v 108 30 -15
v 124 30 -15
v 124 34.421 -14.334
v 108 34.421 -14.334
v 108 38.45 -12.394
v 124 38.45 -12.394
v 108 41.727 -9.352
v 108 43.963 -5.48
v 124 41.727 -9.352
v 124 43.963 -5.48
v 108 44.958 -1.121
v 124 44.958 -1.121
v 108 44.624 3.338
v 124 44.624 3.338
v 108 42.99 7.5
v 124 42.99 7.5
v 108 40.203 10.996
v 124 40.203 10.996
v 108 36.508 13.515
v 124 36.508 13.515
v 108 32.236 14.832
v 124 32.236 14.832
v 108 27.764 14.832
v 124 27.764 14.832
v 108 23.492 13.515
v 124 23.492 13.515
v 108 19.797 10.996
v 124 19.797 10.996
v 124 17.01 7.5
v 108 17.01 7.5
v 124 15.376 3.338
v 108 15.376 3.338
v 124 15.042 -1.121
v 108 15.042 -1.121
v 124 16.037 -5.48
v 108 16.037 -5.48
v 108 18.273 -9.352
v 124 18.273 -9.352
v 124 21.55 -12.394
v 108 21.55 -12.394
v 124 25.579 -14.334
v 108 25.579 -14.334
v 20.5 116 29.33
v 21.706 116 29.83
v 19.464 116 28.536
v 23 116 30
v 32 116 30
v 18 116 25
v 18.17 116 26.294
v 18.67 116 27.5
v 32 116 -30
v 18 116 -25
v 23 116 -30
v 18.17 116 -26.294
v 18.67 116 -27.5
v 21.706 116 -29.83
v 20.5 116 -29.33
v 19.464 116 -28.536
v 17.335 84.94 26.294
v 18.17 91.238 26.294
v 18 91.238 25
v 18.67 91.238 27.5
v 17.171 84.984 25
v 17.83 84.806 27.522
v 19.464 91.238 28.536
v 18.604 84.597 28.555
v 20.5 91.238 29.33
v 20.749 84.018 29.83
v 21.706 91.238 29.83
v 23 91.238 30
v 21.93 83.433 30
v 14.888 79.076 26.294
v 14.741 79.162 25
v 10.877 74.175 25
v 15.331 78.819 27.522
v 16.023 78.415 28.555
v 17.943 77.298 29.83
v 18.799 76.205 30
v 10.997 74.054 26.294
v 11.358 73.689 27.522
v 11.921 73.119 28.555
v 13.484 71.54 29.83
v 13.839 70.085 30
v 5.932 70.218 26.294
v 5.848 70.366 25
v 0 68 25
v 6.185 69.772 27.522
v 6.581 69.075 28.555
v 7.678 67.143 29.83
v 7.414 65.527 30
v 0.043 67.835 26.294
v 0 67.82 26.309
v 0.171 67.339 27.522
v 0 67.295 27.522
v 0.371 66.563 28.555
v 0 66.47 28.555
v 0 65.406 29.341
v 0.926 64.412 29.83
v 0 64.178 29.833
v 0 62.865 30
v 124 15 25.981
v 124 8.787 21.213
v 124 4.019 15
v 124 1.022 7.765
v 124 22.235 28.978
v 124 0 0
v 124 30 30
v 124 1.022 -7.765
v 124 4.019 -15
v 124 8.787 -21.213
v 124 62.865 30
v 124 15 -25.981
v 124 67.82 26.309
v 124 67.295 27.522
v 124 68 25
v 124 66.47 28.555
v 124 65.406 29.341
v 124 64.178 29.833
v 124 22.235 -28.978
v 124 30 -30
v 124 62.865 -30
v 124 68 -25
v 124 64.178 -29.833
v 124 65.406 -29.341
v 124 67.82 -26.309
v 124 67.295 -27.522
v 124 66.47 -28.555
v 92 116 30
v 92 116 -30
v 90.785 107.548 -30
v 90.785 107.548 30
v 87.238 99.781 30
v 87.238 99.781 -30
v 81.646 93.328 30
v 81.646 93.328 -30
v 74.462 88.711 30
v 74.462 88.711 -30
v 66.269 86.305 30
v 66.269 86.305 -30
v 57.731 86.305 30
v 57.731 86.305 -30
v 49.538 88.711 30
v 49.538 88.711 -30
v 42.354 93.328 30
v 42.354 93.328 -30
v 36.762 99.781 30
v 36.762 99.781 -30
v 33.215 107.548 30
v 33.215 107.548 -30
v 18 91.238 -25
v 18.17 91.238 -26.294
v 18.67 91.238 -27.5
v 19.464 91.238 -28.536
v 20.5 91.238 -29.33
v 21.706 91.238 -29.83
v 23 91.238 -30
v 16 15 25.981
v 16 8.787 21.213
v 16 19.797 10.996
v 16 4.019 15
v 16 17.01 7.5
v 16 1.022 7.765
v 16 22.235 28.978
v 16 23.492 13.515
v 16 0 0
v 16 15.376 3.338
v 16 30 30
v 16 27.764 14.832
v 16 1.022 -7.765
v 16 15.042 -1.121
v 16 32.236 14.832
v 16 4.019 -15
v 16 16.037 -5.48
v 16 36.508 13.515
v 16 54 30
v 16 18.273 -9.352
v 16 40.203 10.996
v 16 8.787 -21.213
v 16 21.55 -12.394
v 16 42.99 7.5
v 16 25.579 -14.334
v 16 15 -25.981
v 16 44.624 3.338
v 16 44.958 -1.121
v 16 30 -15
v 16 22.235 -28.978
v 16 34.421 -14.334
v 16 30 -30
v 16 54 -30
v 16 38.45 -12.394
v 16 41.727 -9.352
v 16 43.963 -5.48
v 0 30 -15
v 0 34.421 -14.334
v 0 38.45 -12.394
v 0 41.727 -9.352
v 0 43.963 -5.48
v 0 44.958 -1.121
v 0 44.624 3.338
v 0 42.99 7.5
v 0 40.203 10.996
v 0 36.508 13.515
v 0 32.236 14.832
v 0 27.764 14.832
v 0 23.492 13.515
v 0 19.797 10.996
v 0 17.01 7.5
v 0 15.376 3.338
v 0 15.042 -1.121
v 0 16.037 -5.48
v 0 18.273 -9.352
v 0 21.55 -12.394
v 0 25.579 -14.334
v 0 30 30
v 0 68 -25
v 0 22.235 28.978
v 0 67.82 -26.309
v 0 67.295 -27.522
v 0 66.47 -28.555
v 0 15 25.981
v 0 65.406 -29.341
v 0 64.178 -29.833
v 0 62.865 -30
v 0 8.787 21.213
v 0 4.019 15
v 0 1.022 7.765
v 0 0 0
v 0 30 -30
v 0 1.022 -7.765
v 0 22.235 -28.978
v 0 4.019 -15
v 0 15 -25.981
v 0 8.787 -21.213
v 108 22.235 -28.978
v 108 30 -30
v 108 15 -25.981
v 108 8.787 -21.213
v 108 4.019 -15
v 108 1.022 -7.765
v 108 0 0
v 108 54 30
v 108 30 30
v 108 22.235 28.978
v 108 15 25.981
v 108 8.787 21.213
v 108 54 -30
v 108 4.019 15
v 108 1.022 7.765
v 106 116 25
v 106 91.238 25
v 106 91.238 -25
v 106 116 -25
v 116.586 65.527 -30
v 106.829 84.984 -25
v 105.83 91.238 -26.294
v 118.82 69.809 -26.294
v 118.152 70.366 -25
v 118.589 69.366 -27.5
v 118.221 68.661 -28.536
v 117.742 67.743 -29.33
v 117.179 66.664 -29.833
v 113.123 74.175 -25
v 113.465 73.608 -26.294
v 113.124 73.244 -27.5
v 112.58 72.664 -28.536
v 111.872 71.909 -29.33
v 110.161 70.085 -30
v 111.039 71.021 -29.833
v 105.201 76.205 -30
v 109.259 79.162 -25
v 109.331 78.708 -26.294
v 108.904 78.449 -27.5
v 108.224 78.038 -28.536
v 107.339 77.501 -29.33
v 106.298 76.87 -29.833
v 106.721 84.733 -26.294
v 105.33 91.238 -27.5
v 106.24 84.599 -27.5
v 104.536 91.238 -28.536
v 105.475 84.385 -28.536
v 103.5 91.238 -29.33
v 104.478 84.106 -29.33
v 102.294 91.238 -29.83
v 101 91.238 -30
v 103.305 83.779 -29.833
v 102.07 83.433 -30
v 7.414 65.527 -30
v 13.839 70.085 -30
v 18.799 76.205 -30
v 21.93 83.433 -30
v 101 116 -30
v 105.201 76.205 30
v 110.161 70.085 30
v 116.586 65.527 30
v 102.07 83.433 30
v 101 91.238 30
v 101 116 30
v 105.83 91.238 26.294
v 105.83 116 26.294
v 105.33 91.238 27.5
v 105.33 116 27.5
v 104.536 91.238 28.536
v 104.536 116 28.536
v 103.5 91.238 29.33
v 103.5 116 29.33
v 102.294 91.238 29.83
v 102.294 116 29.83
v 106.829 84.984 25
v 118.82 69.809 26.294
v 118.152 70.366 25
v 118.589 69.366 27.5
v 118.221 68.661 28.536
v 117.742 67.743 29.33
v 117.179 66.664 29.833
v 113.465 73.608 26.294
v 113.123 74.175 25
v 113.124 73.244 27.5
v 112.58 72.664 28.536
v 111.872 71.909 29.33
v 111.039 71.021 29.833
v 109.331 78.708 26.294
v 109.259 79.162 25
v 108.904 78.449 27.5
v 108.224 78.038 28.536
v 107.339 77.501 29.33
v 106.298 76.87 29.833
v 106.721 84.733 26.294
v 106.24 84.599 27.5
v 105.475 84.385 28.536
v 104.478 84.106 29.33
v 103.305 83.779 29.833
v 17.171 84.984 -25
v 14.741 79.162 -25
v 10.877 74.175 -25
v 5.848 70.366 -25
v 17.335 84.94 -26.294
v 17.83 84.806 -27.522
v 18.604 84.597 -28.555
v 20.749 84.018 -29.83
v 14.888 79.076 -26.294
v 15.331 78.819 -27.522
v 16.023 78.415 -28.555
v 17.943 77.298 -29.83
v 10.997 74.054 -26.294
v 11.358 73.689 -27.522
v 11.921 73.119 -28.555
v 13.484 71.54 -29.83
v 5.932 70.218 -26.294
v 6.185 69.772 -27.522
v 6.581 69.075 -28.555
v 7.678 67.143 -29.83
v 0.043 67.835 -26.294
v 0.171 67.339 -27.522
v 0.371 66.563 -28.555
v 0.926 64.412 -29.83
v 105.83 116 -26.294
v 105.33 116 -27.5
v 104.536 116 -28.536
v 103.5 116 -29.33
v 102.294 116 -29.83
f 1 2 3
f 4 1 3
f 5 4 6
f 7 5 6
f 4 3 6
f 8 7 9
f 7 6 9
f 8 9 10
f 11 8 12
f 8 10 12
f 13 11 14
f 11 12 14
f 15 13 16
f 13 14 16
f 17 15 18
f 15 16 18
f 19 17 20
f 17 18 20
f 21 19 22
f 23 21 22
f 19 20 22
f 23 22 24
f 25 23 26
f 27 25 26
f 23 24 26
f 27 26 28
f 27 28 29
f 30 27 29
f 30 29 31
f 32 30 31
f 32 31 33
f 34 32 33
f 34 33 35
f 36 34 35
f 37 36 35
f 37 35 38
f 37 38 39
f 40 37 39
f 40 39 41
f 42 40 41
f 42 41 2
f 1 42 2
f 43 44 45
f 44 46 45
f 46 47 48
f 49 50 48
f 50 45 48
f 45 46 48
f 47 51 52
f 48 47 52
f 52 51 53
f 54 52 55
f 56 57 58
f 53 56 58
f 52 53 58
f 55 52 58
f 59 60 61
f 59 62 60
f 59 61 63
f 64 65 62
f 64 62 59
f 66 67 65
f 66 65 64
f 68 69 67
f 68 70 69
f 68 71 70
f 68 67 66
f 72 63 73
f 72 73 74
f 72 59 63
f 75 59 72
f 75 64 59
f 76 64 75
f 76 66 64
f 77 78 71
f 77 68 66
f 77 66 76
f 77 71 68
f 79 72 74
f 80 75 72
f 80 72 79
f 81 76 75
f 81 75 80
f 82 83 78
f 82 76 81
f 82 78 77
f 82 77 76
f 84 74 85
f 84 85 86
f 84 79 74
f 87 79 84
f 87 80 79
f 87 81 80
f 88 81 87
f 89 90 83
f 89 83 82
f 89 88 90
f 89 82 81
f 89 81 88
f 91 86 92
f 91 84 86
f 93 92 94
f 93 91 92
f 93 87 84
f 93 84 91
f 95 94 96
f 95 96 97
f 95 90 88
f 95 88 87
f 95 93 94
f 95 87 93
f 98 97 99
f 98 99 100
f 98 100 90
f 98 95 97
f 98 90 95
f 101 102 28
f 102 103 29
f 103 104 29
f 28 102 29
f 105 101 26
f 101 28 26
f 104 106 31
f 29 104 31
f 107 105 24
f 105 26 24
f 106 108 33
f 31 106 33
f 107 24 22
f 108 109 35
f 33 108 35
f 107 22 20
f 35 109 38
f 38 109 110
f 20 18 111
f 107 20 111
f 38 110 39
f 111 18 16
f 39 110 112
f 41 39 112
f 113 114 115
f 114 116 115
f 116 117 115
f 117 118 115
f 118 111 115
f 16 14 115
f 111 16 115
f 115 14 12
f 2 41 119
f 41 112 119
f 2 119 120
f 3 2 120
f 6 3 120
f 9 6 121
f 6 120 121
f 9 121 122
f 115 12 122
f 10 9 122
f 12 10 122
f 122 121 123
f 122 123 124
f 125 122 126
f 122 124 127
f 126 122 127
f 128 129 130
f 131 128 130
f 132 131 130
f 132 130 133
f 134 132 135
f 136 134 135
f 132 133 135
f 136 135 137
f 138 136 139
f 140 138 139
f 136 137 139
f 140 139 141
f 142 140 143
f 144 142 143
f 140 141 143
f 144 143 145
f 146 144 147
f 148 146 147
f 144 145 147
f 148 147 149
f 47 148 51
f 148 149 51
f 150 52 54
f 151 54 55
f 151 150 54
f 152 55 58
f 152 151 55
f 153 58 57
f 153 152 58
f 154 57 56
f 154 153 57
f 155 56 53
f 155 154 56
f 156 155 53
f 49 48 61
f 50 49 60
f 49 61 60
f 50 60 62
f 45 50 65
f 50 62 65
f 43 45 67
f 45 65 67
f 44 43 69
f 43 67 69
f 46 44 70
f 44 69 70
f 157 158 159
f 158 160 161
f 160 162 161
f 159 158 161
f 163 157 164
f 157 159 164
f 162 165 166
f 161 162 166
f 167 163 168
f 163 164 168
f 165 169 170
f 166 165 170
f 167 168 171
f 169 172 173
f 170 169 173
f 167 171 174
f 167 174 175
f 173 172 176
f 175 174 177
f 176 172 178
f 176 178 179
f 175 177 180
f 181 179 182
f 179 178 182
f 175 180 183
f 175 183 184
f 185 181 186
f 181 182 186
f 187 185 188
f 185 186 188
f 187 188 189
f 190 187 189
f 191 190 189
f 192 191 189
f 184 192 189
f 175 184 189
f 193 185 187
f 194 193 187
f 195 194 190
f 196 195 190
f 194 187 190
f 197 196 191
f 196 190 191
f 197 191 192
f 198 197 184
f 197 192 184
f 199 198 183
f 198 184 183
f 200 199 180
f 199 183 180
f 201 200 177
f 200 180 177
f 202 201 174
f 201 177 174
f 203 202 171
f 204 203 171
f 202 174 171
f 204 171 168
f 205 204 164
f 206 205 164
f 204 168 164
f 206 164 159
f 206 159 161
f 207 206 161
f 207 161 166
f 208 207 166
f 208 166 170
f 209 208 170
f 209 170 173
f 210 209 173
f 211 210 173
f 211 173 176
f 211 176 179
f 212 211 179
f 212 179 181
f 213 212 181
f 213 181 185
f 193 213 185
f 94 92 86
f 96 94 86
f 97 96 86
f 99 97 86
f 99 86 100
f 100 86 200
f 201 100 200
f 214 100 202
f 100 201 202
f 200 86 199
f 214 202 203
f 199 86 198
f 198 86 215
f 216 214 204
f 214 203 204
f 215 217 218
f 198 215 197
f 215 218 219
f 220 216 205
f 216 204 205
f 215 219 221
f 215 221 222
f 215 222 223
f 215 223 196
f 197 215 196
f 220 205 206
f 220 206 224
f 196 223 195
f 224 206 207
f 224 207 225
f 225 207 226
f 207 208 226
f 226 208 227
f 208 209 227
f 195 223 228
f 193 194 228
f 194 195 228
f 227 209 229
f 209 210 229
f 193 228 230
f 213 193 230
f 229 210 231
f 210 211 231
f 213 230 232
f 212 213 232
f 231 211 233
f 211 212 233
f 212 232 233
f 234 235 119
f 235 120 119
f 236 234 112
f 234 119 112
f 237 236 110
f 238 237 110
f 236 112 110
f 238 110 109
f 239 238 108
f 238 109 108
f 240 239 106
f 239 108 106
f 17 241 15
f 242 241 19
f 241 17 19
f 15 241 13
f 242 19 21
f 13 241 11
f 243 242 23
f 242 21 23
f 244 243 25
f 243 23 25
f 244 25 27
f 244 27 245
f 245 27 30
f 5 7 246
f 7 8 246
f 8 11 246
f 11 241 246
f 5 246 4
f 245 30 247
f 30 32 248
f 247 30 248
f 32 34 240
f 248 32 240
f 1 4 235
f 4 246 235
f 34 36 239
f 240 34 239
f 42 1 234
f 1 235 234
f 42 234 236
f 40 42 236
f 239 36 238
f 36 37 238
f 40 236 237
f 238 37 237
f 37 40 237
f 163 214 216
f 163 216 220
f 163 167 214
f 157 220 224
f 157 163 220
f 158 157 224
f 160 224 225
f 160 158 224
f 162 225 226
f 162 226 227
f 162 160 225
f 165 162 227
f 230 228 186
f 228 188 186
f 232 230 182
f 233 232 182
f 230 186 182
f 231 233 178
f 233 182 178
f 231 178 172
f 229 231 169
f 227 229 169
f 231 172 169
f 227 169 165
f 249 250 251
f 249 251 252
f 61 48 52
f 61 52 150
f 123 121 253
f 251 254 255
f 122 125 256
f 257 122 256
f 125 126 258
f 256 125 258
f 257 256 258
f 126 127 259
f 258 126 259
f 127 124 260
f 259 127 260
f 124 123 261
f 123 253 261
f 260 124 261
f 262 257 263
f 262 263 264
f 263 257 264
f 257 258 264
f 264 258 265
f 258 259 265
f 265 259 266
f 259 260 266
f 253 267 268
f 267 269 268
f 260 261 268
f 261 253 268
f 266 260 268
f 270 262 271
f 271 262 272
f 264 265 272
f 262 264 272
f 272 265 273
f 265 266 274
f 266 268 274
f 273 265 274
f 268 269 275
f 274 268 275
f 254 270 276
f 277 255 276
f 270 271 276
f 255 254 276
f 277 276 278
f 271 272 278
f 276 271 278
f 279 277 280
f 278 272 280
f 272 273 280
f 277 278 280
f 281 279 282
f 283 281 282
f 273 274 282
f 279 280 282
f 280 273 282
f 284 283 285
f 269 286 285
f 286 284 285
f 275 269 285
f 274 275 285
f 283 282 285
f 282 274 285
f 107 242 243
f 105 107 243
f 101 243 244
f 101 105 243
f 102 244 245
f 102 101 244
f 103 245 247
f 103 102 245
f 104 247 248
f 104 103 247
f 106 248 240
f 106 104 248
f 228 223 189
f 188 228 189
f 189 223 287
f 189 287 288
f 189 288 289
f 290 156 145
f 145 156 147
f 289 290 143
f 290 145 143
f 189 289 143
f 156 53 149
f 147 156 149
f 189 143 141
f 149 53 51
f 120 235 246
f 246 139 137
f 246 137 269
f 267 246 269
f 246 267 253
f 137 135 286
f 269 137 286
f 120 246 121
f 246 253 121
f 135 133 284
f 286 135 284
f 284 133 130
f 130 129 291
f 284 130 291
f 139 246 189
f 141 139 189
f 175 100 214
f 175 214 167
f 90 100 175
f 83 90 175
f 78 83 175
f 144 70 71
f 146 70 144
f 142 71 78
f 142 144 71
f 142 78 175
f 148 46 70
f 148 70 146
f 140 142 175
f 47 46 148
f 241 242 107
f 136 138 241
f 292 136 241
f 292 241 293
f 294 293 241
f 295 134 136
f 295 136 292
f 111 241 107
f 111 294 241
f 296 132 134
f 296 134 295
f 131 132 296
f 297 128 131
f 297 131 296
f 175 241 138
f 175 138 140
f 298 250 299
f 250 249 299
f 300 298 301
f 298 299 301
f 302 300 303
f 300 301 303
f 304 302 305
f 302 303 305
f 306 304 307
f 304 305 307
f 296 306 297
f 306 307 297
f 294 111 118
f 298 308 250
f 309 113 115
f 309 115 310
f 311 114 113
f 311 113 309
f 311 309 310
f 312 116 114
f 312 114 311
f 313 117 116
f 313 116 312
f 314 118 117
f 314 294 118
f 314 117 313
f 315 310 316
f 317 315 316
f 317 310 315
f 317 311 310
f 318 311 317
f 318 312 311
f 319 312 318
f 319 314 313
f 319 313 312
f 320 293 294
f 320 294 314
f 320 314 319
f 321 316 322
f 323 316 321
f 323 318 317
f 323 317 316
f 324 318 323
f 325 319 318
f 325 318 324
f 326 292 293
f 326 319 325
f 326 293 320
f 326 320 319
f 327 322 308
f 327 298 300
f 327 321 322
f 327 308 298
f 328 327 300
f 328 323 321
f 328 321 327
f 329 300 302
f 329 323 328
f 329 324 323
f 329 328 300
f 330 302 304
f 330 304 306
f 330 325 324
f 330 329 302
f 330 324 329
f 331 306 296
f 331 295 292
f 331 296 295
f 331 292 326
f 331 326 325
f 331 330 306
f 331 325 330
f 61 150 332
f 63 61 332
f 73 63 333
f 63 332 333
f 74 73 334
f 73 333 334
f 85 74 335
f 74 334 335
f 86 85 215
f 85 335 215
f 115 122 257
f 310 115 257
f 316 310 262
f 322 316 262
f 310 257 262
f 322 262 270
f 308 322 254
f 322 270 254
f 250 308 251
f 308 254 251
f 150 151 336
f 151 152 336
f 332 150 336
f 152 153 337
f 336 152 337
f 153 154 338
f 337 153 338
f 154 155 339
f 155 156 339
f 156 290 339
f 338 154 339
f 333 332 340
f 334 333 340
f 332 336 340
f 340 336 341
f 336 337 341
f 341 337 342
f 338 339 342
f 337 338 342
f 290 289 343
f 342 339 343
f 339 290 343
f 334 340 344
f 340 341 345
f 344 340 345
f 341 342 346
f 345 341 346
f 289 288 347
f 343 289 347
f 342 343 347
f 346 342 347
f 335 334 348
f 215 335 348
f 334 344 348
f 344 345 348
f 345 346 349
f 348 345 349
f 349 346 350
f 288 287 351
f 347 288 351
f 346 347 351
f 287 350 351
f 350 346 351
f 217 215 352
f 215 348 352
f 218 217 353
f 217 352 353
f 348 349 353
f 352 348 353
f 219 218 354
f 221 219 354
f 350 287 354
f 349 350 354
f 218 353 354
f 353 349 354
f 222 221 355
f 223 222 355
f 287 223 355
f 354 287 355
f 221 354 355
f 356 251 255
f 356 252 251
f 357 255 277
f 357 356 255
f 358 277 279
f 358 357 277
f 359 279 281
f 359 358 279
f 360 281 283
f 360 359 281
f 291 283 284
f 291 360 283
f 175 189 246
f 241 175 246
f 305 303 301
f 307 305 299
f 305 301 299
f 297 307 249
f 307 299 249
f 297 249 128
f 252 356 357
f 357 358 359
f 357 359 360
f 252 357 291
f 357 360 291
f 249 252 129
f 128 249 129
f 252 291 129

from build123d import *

# Parameters (mm, degrees)
BOSS_EXTRUDE1_DEPTH      = 30
BOSS_EXTRUDE1_DEPTH_BACK = 30
FILLET1_R                = 5
SKETCH2_R                = 15
CUT_EXTRUDE1_DEPTH       = 124
FILLET2_R                = 30


with BuildPart() as part:
    # Sketch1 → Boss-Extrude1 (new, two sides: drawn at the far end of the back side and taken through both)
    with BuildSketch(Plane.XY.offset(-BOSS_EXTRUDE1_DEPTH_BACK)):
        with BuildLine():
            Line((108, 0), (124, 0))
            Line((124, 0), (124, 68))
            ThreePointArc((124, 68), (111.026334039, 76.540961621), (106, 91.237900077))
            Line((106, 91.237900077), (106, 116))
            Line((106, 116), (92, 116))
            ThreePointArc((92, 116), (62, 86), (32, 116))
            Line((32, 116), (18, 116))
            Line((18, 116), (18, 91.237900077))
            ThreePointArc((18, 91.237900077), (12.973665961, 76.540961621), (0, 68))
            Line((0, 68), (0, 0))
            Line((0, 0), (16, 0))
            Line((16, 0), (16, 54))
            Line((16, 54), (108, 54))
            Line((108, 54), (108, 0))
        make_face()
    extrude(amount=BOSS_EXTRUDE1_DEPTH + BOSS_EXTRUDE1_DEPTH_BACK)

    # Fillet1
    fillet1_edges = [part.edges().sort_by_distance(p)[0] for p in [
        (106, 103.618950039, -30),
        (111.026334039, 76.540961621, -30),
        (18, 103.618950039, 30),
        (12.973665961, 76.540961621, 30),
        (12.973665961, 76.540961621, -30),
        (111.026334039, 76.540961621, 30),
        (106, 103.618950039, 30),
        (18, 103.618950039, -30),
    ]]
    fillet(fillet1_edges, radius=FILLET1_R)

    # Sketch2 → Cut-Extrude1 (cut)
    with BuildSketch(Plane(origin=(124, 0, 0), x_dir=(0, 0, -1), z_dir=(1, 0, 0))):
        with Locations((0, 30)):
            Circle(SKETCH2_R)
    extrude(amount=-CUT_EXTRUDE1_DEPTH, mode=Mode.SUBTRACT)

    # Fillet2
    fillet2_edges = [part.edges().sort_by_distance(p)[0] for p in [
        (116, 0, -30),
        (116, 0, 30),
        (8, 0, -30),
        (8, 0, 30),
    ]]
    fillet(fillet2_edges, radius=FILLET2_R - 0.0001)  # a hair under: the kernel refuses the full size


solid = part.part
